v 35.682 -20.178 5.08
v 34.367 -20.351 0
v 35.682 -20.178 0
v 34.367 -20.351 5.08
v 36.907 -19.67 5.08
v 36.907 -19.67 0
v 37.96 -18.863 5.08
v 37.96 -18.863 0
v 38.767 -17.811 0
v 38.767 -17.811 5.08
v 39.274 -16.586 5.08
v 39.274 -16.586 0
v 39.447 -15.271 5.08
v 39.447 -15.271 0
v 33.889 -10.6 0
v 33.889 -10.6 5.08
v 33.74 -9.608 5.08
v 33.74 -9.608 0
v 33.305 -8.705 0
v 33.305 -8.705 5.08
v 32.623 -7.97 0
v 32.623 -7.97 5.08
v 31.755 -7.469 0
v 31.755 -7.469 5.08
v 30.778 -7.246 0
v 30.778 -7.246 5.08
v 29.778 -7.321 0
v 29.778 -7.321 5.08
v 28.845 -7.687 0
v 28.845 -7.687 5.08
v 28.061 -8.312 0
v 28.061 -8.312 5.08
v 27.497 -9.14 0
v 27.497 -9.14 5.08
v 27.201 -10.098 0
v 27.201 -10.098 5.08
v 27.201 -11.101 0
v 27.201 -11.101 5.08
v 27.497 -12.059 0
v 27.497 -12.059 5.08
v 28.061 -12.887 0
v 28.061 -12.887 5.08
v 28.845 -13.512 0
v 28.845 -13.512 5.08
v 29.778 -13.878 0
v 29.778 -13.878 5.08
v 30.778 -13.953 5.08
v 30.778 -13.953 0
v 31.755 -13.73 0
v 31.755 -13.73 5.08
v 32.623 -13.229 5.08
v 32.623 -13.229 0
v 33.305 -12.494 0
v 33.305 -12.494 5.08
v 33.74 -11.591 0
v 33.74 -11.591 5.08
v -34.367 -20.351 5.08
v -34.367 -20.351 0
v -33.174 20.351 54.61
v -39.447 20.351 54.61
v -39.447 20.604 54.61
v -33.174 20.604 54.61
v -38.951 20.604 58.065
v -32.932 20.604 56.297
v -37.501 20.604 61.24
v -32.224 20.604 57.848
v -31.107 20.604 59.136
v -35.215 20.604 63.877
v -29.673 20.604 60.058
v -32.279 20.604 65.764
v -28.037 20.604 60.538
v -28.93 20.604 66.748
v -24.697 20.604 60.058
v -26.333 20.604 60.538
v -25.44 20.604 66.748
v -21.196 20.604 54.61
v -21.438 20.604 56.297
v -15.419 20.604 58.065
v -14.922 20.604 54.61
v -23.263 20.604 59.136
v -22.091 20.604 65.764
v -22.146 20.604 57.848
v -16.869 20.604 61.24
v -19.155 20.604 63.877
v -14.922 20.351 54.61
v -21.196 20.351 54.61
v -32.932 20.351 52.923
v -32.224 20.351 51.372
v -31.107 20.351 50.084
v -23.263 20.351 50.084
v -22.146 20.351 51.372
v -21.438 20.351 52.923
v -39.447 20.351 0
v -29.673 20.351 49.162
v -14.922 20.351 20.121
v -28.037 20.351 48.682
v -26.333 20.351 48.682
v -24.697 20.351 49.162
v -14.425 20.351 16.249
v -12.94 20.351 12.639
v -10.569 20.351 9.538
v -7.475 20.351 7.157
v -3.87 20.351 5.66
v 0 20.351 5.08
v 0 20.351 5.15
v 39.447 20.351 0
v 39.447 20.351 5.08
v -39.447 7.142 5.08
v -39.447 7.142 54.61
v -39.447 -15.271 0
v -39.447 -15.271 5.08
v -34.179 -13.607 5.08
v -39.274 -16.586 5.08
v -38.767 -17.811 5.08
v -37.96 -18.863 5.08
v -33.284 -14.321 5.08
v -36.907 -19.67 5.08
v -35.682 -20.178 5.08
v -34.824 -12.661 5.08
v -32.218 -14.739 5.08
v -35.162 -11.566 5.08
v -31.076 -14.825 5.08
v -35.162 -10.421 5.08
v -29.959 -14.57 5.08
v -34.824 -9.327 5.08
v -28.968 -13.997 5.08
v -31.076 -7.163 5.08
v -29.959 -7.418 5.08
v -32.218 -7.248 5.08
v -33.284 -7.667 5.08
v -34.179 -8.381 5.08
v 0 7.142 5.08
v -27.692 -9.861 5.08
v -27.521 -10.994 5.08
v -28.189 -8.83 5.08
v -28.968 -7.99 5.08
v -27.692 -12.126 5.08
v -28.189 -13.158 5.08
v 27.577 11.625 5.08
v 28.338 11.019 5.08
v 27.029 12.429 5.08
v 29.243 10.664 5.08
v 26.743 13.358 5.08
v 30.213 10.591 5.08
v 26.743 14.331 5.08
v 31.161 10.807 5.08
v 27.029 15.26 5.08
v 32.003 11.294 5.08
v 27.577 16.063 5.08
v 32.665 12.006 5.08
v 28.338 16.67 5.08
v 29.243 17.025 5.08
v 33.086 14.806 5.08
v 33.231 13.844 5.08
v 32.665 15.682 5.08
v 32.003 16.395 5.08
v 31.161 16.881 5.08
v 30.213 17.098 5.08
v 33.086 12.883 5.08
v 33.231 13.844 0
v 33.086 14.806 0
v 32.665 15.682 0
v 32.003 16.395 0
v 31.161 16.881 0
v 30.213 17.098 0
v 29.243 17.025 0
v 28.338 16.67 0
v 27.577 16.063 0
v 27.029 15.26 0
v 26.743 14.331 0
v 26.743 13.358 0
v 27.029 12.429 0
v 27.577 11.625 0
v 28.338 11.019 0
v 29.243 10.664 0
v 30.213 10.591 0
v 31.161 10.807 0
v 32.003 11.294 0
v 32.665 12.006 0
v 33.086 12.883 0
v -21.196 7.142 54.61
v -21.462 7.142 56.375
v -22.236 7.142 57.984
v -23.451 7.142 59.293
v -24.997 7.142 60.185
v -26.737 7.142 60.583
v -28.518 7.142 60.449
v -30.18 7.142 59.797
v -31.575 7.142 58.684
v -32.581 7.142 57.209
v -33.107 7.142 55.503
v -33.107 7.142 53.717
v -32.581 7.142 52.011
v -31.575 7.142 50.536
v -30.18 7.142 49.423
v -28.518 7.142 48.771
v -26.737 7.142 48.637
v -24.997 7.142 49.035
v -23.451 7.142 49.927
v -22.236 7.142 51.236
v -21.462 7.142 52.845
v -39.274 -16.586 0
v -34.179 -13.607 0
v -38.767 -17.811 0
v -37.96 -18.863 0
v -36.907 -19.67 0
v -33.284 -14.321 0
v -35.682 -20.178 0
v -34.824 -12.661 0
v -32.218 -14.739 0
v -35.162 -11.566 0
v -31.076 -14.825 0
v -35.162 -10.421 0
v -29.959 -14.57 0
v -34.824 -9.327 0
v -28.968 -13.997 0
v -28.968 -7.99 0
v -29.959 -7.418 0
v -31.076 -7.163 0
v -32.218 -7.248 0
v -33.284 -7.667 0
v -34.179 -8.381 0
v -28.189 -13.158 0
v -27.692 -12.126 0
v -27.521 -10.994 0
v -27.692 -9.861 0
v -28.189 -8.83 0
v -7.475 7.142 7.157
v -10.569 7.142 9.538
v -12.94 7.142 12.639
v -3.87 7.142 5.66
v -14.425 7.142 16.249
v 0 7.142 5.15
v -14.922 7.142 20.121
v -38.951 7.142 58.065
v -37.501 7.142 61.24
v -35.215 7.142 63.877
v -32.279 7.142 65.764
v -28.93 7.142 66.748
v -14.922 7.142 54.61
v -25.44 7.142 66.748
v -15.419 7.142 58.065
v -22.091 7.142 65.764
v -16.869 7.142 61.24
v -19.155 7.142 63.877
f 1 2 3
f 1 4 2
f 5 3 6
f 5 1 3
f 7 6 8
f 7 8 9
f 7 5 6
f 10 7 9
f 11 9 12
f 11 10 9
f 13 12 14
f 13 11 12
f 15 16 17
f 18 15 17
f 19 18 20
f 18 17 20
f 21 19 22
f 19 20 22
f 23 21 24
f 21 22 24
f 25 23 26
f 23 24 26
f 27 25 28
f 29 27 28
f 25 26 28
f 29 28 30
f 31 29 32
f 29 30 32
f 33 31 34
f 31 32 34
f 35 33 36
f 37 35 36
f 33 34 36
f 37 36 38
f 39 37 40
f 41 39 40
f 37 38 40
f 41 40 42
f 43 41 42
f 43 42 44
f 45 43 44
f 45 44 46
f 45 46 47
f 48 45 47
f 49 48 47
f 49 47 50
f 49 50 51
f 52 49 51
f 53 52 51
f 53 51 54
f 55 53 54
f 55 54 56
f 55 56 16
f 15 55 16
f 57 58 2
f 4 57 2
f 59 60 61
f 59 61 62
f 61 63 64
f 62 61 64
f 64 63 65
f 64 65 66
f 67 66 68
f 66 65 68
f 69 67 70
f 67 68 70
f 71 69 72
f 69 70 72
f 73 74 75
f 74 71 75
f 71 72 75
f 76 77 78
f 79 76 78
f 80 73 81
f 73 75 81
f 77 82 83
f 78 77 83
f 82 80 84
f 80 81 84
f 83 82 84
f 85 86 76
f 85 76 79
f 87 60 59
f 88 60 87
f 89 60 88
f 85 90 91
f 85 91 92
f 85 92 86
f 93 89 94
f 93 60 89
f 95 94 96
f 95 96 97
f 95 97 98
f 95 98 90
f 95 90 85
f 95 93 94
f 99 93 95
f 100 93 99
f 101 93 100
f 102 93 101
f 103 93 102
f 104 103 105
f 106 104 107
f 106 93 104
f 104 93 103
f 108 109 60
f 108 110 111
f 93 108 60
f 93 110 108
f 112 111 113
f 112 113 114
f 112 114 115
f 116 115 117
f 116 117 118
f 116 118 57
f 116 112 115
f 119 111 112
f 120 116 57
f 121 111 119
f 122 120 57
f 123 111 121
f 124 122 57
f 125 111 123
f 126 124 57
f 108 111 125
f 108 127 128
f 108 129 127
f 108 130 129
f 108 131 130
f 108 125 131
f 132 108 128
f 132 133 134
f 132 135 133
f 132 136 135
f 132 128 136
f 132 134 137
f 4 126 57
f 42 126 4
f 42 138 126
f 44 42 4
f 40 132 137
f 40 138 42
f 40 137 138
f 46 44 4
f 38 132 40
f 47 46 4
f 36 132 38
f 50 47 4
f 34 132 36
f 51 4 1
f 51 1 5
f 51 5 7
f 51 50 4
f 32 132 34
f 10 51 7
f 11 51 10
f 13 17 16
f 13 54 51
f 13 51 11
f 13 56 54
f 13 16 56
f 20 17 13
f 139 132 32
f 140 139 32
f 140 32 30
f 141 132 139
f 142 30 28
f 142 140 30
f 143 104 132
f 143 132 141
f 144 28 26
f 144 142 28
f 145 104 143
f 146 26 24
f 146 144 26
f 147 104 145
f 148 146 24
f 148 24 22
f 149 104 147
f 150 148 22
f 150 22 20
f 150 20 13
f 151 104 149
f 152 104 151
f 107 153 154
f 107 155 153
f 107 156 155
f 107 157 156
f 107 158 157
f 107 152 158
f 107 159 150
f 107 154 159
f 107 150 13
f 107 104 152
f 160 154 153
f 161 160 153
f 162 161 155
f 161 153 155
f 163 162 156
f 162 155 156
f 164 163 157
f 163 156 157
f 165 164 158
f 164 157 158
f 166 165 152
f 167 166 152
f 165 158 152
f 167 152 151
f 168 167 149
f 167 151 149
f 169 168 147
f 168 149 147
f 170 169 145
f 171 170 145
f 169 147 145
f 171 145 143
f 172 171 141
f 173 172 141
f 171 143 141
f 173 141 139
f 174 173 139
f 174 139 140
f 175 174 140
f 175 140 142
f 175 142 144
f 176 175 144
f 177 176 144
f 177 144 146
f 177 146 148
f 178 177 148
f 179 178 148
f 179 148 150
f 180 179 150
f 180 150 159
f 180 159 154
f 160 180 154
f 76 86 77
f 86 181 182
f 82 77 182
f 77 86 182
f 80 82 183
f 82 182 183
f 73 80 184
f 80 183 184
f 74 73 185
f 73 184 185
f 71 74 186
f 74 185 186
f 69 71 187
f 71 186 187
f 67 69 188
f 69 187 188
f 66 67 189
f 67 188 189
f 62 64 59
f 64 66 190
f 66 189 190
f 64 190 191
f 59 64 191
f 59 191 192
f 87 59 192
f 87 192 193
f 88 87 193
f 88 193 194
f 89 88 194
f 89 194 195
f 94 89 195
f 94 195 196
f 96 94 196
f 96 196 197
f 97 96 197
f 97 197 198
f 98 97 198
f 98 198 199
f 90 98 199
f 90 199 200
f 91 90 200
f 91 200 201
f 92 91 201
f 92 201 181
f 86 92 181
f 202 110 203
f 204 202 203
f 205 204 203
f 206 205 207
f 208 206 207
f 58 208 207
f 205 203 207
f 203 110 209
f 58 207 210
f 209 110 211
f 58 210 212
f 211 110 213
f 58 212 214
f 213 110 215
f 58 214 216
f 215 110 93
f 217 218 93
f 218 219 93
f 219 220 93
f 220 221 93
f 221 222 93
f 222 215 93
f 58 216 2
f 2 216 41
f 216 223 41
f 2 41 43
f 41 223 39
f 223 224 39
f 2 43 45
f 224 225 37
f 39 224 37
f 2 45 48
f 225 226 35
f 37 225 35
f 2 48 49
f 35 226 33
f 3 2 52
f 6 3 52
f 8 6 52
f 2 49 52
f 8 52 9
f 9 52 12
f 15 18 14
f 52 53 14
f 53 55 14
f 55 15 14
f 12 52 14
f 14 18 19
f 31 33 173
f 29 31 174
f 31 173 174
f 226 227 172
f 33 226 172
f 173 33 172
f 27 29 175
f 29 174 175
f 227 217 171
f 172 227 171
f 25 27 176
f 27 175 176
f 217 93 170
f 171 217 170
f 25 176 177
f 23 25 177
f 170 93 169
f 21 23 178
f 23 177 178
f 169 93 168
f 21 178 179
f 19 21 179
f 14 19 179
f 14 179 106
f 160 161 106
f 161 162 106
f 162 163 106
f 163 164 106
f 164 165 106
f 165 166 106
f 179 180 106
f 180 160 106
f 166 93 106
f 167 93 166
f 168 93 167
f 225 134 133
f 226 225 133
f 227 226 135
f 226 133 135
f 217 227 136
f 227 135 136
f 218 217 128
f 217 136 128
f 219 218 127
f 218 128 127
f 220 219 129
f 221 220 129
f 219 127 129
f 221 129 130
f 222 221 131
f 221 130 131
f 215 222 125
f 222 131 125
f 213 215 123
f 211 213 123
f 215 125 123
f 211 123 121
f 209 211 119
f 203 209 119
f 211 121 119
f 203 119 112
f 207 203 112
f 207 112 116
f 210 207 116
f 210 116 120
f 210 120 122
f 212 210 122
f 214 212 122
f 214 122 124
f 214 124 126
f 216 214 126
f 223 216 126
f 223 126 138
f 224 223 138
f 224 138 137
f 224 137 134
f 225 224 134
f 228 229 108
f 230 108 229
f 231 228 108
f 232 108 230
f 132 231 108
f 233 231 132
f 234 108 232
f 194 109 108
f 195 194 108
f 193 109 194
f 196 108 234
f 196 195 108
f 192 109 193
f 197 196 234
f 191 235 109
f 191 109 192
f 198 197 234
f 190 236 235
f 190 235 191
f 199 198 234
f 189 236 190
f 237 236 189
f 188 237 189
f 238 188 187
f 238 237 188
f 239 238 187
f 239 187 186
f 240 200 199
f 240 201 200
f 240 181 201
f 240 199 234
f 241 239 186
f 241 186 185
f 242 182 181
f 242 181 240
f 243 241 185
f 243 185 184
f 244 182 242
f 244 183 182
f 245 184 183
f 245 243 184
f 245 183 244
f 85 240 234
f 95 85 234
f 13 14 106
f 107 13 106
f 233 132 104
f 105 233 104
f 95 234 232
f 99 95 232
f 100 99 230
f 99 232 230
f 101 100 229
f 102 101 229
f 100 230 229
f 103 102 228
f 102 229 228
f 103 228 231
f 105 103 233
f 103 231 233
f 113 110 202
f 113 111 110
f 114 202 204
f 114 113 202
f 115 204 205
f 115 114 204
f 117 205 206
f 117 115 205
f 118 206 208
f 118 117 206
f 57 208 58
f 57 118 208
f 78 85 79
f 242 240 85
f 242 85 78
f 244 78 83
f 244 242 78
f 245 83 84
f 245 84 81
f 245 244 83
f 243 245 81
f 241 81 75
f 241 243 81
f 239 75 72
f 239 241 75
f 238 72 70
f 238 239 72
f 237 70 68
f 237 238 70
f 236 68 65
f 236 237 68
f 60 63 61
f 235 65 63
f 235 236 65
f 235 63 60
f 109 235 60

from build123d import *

# Parameters (mm, degrees)
F0_W      = 78.894876
F0_H      = 40.701952
F1_DEPTH  = 5.08
F2_R      = 5.08
F3_R      = 3.262526
F3_R_2    = 3.362851
F3_R_3    = 3.841691
F4_DEPTH  = 25.4
F5_W      = 39.447438
F5_H      = 13.209066
F6_DEPTH  = 49.53
F8_DEPTH  = 25.4
F10_DEPTH = 13.462
F11_R     = 5.989358
F12_DEPTH = 25.4


with BuildPart() as f1:
    # F0 (on Top) → F1 (new body)
    with BuildSketch(Plane.XY):
        Rectangle(F0_W, F0_H)
    extrude(amount=F1_DEPTH)

    # F2
    f2_edges = [f1.edges().sort_by_distance(p)[0] for p in [
        (-39.447438, -20.350976, 2.54),
        (39.447438, -20.350976, 2.54),
    ]]
    fillet(f2_edges, radius=F2_R)

    # F3 (on face) → F4 (cut)
    with BuildSketch(Plane.XY.offset(5.08)):
        with Locations((29.968904, 13.844252)):
            Circle(F3_R)
        with Locations((30.526463, -10.599568)):
            Circle(F3_R_2)
        with Locations((-31.362806, -10.993823)):
            Circle(F3_R_3)
    extrude(amount=-F4_DEPTH, mode=Mode.SUBTRACT)

    # F5 (on face) → F6 (join)
    with BuildSketch(Plane.XY.offset(5.08)):
        with Locations((-19.723719, 13.746443)):
            Rectangle(F5_W, F5_H)
    extrude(amount=F6_DEPTH)

    # F7 (on face) → F8 (cut)
    with BuildSketch(Plane.XZ.offset(-7.14191)):
        with BuildLine():
            Line((0, 20.121116), (0, 34.994766))
            ThreePointArc((0, 34.994766), (-10.534541, 30.641328), (-14.92249, 20.121116))
            Line((-14.92249, 20.121116), (0, 20.121116))
        make_face()
        with BuildLine():
            ThreePointArc((-14.92249, 20.121116), (-10.534541, 30.641328), (0, 34.994766))
            Line((0, 34.994766), (0, 54.61))
            Line((0, 54.61), (-14.92249, 54.61))
            Line((-14.92249, 54.61), (-14.92249, 20.121116))
        make_face()
        with BuildLine():
            ThreePointArc((-14.92249, 20.121116), (-10.569132, 9.537655), (0, 5.149625))
            Line((0, 5.149625), (0, 20.121116))
            Line((0, 20.121116), (-14.92249, 20.121116))
        make_face()
    extrude(amount=-F8_DEPTH, mode=Mode.SUBTRACT)

    # F9 (on face) → F10 (join)
    with BuildSketch(Plane.XZ.offset(-7.14191)):
        with BuildLine():
            Line((-39.447438, 54.61), (-14.92249, 54.61))
            ThreePointArc((-14.92249, 54.61), (-27.184964, 66.872474), (-39.447438, 54.61))
        make_face()
    extrude(amount=-F10_DEPTH)

    # F11 (on face) → F12 (cut)
    with BuildSketch(Plane.XZ.offset(-7.14191)):
        with Locations((-27.184964, 54.61)):
            Circle(F11_R)
    extrude(amount=-F12_DEPTH, mode=Mode.SUBTRACT)


solid = f1.part
